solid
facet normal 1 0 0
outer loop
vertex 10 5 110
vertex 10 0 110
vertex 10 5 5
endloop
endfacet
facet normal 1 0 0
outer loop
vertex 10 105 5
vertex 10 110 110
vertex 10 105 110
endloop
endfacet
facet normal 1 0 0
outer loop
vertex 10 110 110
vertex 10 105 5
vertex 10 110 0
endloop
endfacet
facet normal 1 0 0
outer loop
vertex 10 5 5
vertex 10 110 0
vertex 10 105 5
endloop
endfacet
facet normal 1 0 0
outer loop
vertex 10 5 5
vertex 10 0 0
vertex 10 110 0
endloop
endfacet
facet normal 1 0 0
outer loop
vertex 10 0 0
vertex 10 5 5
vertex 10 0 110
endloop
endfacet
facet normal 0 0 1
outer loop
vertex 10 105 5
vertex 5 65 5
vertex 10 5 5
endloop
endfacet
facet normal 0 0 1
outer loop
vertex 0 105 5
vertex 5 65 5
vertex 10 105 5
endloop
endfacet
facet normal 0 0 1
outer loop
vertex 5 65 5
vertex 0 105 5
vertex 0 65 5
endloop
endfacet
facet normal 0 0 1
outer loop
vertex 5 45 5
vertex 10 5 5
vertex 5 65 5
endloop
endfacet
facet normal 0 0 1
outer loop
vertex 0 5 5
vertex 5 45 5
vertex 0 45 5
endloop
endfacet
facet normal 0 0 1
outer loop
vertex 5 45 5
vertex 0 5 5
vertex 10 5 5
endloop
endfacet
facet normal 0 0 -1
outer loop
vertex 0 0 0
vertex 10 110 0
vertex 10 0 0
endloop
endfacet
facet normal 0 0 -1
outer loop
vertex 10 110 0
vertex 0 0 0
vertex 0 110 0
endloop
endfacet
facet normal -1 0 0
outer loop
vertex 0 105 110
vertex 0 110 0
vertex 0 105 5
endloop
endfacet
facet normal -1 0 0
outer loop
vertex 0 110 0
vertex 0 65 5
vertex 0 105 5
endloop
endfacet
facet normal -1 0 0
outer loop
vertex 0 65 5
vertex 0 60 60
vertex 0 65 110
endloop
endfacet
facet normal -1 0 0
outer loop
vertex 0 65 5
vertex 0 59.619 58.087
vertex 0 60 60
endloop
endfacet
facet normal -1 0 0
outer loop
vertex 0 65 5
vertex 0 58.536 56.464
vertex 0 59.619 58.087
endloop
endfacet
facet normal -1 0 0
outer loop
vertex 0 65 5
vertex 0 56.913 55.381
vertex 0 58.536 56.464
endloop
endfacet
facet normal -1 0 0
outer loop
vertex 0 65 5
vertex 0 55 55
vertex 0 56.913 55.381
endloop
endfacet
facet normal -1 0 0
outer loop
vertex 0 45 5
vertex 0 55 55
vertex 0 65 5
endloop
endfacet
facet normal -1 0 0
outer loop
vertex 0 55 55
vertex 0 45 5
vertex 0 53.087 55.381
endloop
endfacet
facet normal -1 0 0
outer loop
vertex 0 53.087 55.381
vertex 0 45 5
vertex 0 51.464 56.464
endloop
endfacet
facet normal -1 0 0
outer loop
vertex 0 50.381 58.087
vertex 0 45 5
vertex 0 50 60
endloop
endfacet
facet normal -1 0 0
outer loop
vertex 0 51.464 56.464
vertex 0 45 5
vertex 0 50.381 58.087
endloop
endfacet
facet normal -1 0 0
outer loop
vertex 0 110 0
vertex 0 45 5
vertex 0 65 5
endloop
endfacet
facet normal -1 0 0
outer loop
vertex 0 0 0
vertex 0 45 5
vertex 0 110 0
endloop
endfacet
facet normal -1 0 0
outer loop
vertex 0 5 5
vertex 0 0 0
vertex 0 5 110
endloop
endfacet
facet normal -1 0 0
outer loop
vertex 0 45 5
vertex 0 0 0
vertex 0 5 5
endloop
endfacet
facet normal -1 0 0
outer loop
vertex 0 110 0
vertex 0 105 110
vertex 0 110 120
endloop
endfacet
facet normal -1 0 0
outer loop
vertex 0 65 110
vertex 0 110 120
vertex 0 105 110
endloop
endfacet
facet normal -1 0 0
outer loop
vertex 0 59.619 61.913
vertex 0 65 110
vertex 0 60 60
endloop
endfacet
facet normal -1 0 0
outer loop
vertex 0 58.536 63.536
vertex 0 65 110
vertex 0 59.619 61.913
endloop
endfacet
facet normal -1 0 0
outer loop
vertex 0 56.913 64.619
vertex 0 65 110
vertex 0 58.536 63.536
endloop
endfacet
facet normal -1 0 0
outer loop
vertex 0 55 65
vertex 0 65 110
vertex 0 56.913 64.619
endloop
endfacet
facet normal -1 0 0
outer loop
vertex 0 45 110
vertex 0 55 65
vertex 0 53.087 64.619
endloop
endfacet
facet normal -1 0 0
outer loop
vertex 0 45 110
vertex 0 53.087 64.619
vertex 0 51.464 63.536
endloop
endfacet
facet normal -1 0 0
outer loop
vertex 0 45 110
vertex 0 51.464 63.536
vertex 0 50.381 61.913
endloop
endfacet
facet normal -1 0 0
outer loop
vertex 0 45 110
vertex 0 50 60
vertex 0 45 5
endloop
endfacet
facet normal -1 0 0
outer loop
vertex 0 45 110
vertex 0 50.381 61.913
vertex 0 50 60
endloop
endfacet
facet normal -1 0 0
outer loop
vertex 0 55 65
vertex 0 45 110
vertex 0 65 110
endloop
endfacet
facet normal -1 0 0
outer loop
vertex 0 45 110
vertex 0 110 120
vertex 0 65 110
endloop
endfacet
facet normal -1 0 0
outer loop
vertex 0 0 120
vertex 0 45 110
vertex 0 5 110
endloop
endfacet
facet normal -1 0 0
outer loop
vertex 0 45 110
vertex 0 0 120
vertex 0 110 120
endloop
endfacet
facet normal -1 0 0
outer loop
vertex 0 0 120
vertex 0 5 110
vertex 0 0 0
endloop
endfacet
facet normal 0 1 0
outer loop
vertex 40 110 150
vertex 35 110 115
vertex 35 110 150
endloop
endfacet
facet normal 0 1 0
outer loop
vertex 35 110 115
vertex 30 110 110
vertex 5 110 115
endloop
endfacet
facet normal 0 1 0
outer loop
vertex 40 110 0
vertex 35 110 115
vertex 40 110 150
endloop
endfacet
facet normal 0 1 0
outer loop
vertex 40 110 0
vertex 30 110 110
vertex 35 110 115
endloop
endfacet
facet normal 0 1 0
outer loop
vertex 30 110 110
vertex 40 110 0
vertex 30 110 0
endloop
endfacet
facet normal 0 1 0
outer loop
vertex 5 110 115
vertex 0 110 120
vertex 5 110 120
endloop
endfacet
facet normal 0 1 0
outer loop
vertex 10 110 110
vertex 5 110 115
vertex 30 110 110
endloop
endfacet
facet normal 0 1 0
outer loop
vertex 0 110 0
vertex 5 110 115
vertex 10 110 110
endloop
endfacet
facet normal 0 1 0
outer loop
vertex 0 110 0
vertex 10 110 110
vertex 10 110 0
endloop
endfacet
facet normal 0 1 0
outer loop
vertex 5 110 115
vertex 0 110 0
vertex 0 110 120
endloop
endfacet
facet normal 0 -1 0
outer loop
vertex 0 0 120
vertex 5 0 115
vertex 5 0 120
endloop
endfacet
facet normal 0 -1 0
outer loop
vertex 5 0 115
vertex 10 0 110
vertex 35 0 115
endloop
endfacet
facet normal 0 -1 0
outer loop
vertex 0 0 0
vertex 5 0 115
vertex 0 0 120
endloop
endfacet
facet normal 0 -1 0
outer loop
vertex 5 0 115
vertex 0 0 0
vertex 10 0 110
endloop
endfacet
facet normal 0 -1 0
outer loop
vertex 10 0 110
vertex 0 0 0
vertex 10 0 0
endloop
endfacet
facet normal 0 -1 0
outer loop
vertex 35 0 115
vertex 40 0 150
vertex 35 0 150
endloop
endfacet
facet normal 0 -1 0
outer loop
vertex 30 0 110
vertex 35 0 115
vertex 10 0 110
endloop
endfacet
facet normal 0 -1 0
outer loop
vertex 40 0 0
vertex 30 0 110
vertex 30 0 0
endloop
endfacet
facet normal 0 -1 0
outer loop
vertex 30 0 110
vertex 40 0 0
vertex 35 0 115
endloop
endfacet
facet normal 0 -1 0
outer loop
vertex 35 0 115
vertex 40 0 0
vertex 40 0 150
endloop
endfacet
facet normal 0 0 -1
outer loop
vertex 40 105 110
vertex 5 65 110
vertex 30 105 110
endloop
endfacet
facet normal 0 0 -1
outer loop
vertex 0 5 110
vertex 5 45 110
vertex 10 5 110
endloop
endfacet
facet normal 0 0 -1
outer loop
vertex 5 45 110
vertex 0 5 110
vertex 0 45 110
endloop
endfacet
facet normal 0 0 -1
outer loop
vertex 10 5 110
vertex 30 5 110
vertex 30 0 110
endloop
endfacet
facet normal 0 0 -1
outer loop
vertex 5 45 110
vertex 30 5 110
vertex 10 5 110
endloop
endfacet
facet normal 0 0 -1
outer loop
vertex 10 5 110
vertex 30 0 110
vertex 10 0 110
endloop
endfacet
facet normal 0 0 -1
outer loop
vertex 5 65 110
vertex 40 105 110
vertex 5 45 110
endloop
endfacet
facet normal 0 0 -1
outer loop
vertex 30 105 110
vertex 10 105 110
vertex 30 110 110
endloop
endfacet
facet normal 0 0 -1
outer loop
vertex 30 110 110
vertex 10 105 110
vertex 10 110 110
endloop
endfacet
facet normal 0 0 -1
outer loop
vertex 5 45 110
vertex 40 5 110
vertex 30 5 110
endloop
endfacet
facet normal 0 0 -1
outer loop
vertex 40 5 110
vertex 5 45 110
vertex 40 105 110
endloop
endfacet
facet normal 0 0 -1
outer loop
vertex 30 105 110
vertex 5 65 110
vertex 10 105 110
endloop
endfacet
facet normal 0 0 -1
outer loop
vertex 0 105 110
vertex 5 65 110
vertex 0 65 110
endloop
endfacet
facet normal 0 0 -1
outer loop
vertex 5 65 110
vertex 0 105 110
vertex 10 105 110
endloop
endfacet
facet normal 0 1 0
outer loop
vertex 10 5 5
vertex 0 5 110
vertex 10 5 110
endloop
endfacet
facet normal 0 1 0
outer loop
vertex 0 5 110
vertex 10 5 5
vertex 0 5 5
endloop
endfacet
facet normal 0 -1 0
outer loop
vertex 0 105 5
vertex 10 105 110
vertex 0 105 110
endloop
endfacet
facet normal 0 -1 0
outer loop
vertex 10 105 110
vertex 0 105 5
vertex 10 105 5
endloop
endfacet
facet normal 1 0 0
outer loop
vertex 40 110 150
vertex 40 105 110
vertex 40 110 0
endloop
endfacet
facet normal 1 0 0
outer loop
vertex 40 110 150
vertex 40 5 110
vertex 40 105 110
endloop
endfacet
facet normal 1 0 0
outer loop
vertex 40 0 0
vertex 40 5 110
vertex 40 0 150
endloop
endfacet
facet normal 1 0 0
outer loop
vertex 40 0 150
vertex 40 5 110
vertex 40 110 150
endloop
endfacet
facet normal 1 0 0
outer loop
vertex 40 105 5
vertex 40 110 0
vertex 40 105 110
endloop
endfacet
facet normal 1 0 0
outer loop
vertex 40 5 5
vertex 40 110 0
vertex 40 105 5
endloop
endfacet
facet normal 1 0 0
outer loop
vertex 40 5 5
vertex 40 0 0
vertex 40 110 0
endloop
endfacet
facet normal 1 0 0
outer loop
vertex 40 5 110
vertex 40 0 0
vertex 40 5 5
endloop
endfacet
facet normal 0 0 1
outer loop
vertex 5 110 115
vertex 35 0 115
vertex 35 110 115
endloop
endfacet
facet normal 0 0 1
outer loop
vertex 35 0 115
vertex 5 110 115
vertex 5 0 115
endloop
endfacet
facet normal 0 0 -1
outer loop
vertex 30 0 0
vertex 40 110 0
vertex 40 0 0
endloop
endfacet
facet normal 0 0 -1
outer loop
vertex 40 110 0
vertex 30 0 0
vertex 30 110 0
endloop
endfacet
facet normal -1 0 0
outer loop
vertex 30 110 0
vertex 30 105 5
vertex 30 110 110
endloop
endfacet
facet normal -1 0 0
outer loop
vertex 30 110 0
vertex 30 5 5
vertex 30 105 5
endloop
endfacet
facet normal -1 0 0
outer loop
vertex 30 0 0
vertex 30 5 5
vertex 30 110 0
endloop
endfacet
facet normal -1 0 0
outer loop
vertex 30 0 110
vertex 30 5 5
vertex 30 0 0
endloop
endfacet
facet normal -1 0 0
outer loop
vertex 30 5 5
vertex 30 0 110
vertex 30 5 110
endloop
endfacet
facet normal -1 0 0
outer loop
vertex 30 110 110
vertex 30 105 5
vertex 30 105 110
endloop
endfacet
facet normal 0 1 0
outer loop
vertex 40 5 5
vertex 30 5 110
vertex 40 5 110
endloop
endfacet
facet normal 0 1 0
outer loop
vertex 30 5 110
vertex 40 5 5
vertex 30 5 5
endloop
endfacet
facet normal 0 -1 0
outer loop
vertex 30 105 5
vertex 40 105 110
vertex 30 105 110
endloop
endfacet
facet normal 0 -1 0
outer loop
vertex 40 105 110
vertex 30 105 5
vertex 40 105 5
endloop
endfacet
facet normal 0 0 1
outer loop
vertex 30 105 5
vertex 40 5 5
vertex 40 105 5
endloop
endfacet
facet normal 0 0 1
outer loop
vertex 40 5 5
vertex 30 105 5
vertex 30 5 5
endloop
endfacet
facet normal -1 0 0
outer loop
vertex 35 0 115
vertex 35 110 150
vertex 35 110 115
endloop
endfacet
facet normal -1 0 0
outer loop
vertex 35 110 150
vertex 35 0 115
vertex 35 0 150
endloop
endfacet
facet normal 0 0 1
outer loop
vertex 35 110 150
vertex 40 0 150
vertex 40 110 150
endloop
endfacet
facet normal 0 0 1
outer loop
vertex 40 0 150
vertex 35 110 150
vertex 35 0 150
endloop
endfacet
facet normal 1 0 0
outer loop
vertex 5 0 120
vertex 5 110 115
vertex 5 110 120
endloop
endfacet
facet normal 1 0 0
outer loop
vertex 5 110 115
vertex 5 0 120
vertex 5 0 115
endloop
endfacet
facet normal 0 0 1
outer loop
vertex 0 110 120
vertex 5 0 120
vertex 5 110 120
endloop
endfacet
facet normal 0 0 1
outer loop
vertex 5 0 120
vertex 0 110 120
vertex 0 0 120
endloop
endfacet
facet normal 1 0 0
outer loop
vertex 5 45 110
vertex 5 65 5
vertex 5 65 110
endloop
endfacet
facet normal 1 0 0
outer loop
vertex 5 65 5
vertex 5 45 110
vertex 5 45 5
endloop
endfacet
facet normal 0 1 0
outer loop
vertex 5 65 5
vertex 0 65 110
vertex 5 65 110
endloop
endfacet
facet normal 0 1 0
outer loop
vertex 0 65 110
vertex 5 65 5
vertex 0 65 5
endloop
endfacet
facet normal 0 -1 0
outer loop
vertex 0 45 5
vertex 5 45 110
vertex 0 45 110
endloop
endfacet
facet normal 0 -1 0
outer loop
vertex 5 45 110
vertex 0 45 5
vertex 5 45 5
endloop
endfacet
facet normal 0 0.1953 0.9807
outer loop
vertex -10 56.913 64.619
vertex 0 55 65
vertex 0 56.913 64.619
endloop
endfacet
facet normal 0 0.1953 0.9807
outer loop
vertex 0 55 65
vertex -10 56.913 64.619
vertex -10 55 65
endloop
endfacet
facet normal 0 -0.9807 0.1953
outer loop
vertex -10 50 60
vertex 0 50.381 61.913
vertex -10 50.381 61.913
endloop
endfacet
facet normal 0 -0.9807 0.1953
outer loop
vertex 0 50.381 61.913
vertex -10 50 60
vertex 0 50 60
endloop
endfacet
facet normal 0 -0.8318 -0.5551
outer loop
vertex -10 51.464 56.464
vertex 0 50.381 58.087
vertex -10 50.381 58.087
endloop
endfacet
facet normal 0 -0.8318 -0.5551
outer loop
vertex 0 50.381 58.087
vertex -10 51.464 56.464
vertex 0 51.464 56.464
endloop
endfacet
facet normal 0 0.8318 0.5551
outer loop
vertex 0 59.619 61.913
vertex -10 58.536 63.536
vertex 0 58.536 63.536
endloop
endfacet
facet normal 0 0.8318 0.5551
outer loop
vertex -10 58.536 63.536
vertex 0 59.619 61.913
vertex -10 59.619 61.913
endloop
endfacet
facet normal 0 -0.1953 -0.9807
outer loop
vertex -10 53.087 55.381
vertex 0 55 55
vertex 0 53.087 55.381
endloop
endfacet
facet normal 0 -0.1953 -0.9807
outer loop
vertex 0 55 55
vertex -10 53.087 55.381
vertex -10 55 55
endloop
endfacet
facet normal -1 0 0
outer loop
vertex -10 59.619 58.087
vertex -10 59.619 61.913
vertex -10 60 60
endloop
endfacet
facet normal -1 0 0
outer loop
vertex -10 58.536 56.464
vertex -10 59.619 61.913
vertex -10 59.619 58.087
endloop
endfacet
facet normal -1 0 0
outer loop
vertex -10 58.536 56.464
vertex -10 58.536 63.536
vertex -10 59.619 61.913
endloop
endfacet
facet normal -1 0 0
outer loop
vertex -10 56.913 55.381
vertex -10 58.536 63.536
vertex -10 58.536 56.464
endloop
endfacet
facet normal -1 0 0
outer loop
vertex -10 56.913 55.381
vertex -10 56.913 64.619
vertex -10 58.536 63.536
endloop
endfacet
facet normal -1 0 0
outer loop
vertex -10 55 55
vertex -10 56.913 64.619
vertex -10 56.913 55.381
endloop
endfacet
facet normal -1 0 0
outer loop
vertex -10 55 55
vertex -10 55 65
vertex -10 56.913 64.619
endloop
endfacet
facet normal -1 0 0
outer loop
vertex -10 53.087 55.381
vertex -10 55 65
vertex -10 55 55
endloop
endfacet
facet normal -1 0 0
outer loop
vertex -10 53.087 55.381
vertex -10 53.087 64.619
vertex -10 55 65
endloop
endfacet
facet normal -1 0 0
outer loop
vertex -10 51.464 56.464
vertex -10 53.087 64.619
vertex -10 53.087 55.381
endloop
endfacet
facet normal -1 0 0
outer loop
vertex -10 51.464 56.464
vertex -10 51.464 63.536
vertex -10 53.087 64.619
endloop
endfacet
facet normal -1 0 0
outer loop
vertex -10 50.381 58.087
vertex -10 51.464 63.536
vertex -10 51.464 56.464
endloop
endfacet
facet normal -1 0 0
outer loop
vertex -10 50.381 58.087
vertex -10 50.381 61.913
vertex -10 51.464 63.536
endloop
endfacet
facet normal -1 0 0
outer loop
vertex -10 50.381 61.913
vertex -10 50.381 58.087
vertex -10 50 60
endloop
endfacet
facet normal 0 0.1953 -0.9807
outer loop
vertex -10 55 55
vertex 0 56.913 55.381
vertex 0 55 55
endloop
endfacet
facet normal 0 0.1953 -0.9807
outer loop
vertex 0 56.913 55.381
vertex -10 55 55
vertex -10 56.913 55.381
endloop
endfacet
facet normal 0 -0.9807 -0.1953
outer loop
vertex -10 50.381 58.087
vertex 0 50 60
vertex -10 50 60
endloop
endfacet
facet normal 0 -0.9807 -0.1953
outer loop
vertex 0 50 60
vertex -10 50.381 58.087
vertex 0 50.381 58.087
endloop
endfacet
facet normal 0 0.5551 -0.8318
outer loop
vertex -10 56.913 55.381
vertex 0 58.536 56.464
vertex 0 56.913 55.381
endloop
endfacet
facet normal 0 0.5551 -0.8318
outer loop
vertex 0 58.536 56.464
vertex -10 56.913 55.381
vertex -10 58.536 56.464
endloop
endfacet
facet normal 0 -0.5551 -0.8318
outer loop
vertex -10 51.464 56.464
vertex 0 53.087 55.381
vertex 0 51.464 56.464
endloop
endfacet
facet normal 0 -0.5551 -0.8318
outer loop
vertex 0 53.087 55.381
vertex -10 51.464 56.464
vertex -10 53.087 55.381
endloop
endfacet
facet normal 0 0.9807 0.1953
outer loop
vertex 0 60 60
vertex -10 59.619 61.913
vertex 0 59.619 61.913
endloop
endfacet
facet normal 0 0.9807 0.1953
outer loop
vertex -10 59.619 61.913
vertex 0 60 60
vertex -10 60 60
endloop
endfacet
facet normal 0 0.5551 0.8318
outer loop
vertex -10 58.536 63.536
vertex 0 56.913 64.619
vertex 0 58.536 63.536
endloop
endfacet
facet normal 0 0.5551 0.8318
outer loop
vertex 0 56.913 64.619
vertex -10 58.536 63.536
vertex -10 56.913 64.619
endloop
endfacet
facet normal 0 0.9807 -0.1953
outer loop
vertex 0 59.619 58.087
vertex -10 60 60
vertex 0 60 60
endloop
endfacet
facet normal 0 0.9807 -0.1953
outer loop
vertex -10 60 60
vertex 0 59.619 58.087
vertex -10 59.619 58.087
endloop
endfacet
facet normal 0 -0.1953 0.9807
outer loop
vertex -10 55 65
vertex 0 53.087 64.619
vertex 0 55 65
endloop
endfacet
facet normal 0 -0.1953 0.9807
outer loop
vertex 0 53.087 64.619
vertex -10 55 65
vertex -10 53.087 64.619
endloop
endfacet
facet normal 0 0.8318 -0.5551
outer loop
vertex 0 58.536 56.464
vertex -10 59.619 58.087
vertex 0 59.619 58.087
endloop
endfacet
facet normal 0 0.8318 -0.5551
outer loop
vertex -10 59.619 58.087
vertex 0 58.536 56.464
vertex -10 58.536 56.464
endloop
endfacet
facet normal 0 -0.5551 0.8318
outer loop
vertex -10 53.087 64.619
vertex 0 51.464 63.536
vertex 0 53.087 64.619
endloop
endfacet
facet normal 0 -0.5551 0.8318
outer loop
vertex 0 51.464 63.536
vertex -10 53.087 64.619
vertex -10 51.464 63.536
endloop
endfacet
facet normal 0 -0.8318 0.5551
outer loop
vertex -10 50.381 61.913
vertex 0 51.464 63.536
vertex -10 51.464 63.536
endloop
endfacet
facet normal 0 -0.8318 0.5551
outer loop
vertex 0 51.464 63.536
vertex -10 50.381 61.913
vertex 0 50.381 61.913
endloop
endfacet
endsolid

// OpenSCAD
//подставка
cube ([10,110,5]);
cube ([10,5,110]);
translate ([0,105,0])cube ([10,5,110]);
translate ([0,0,110])cube ([40,110,5]);
translate ([30,0,0])cube ([10,5,110]);
translate ([30,105,0])cube ([10,5,110]);
translate ([30,0,0])cube ([10,110,5]);
translate ([35,0,150])rotate ([0,90,0,])cube ([40,110,5]);
translate ([0,0,120])rotate ([0,90,0,])cube ([5,110,5]);
translate ([0,45,5]) cube ([5,20,105]);
translate ([-10,55,60])rotate ([0,90,0])cylinder (10,5,5);
